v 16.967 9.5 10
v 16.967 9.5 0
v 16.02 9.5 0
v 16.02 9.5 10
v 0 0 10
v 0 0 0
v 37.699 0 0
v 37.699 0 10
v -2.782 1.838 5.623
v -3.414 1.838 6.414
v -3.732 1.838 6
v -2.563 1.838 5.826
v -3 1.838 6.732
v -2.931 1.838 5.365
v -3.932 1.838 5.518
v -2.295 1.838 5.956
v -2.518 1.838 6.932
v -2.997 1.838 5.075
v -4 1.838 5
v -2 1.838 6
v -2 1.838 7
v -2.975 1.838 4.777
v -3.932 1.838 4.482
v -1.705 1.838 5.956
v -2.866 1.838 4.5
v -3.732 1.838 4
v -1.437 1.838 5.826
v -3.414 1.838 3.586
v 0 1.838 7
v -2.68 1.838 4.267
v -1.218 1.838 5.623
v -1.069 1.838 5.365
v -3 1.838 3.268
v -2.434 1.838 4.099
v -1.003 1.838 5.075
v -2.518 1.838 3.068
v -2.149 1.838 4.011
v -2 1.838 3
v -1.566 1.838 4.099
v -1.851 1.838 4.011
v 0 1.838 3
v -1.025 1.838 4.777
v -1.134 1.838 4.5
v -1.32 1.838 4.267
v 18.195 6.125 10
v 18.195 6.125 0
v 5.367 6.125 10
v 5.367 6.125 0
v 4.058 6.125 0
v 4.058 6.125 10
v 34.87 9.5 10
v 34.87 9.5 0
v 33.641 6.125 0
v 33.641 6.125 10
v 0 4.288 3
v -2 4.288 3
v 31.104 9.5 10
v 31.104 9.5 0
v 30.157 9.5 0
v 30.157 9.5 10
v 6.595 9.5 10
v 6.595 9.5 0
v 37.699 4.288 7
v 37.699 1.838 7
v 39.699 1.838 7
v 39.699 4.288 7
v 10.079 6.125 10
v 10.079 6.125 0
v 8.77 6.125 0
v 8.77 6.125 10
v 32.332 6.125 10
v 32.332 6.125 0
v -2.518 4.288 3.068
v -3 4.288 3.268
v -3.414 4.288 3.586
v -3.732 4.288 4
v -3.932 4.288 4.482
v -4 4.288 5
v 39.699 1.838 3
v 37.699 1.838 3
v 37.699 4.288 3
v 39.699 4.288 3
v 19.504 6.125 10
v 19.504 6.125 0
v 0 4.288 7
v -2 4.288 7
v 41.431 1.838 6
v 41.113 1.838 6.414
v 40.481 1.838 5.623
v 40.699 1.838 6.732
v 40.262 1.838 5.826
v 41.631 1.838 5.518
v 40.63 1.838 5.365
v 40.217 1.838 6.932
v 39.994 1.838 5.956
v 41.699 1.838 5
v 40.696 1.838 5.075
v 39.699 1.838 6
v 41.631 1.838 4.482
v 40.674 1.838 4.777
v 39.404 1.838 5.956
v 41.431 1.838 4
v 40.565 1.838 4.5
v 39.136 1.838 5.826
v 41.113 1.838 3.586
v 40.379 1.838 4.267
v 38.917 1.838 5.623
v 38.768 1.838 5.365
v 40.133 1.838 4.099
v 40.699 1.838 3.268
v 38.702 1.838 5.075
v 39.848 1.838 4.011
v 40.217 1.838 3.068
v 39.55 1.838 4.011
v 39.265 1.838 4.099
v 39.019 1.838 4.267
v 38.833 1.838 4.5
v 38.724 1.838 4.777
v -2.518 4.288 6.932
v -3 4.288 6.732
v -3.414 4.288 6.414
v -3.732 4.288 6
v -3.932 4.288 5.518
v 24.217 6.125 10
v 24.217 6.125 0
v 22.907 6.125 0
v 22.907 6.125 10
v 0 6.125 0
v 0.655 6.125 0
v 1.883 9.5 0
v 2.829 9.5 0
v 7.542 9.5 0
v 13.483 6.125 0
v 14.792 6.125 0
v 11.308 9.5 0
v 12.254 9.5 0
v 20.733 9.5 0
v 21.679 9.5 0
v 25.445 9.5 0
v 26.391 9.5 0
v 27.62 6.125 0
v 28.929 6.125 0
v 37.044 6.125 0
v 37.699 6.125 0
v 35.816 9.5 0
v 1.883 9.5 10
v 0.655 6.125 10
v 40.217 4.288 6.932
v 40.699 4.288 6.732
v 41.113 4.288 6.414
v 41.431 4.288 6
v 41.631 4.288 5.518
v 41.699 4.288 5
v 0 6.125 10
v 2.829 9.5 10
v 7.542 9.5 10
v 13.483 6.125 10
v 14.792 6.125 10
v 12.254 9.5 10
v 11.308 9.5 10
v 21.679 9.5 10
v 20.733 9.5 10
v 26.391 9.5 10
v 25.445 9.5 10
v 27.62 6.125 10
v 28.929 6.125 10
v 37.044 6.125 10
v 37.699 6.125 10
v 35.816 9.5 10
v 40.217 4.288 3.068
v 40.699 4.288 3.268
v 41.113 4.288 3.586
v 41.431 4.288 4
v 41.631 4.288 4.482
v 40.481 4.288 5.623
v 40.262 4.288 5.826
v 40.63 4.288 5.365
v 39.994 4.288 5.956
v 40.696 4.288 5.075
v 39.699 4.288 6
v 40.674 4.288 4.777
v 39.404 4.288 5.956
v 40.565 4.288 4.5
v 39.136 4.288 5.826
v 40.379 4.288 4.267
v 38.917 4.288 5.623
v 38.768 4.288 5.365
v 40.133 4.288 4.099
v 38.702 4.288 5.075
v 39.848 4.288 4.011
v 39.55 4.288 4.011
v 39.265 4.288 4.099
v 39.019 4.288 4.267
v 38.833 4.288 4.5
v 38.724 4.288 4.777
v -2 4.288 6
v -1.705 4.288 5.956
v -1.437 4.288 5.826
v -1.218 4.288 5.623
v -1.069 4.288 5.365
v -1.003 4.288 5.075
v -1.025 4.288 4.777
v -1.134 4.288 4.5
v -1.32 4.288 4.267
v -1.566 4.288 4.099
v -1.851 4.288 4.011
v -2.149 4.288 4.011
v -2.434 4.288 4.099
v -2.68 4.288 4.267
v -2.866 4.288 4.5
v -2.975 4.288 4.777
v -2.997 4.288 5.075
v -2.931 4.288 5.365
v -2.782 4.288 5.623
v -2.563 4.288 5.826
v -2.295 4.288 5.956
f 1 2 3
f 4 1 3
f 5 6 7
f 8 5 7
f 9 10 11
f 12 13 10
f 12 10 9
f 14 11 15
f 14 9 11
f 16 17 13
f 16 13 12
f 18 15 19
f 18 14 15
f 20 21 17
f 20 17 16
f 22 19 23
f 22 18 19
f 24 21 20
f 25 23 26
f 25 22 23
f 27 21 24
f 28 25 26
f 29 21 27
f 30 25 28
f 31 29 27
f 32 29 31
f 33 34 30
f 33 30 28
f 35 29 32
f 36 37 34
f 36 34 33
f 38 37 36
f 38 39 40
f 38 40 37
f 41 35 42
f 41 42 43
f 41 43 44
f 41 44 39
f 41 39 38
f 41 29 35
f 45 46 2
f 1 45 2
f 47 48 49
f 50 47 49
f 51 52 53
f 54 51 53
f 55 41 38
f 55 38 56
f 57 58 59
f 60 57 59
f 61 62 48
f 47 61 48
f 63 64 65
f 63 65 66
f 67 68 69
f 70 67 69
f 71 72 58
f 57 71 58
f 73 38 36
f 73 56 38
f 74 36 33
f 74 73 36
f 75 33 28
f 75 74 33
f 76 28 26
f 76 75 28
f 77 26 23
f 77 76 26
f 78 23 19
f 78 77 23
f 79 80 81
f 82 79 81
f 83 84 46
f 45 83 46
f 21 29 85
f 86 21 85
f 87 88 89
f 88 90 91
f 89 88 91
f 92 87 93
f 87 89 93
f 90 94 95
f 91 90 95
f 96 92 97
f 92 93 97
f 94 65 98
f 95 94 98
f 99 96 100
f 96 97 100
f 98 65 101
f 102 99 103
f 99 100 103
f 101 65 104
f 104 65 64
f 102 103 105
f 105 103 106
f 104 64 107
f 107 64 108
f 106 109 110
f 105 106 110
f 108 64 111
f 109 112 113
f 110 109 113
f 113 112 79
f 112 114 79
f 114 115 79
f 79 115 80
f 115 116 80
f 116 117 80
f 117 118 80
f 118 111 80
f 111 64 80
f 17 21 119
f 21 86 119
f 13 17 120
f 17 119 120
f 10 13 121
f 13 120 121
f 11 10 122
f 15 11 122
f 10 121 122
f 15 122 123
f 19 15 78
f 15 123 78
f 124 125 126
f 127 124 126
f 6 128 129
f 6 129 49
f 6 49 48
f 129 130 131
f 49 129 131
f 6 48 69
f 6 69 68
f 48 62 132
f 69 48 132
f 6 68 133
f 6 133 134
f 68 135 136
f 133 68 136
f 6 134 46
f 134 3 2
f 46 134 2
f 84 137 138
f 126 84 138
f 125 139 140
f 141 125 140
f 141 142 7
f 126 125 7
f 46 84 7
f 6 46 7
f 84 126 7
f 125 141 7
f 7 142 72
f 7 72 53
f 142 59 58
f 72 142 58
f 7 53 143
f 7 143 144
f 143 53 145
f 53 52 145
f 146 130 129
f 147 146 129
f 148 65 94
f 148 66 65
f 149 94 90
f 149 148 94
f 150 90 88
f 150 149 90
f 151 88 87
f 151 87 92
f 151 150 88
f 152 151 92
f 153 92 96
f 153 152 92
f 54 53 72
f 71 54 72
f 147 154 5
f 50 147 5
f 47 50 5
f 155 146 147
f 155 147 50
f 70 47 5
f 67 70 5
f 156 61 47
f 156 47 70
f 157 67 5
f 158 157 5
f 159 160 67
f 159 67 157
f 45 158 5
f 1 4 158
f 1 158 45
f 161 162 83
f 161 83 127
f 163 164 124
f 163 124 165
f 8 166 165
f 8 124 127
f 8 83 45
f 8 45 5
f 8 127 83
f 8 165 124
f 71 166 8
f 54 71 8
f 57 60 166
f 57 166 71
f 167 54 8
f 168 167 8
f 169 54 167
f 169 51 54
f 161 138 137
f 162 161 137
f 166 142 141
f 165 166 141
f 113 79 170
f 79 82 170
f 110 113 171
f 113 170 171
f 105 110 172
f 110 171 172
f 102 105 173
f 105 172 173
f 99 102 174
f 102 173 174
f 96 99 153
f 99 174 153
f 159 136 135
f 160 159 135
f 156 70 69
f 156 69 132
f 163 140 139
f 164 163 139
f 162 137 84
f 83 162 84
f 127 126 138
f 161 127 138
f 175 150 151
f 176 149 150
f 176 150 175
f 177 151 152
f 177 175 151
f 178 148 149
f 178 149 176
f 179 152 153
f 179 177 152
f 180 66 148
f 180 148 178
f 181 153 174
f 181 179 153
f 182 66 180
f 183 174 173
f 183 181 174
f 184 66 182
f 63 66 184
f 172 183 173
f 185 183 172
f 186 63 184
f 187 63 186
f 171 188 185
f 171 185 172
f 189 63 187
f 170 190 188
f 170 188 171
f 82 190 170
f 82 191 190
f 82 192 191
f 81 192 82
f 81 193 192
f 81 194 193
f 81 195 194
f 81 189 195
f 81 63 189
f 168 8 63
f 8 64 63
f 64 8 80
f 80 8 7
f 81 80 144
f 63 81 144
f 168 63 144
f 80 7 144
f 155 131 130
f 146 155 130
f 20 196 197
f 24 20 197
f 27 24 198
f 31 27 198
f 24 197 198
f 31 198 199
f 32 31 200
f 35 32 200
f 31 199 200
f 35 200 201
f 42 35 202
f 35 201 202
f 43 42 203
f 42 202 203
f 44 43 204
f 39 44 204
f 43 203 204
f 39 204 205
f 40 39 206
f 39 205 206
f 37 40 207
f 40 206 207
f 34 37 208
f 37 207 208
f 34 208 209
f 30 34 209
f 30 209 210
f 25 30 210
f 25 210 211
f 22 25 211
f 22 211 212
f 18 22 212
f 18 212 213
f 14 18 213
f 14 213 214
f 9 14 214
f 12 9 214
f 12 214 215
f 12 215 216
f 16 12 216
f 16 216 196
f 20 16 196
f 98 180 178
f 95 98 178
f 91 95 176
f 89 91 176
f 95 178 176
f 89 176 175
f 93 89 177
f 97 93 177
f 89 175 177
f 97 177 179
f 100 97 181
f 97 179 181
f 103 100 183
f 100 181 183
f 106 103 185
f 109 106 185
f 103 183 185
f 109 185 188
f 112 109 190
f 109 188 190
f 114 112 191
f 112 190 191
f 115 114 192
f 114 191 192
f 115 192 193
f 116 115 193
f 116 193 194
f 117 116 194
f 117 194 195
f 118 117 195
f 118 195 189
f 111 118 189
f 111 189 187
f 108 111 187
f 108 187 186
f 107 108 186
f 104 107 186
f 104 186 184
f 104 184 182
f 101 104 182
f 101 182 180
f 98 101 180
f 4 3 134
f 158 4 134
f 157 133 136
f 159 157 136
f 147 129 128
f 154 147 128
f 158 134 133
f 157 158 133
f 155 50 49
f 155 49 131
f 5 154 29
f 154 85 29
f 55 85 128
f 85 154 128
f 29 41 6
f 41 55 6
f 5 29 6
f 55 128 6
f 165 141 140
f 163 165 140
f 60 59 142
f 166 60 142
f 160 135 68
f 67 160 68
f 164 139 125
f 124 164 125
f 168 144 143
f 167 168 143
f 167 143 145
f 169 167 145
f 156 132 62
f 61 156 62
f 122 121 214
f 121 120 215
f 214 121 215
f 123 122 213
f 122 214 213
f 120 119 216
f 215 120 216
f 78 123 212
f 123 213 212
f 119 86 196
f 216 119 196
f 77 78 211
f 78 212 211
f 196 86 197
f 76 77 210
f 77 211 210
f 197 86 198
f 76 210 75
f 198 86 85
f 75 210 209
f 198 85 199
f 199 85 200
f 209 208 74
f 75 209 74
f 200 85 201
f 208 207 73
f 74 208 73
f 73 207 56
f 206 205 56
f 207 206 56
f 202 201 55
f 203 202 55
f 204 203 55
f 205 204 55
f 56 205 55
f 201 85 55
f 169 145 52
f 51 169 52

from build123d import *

# Parameters (mm, degrees)
EXTRUIR1_DEPTH = 10
CROQUIS5_W     = 4
CROQUIS5_H     = 2.45
EXTRUIR2_DEPTH = 4
REDONDEO1_R    = 2
CROQUIS6_R     = 1
EXTRUIR3_DEPTH = 4


with BuildPart() as part:
    # Croquis4 → Extruir1 (new body)
    with BuildSketch(Plane.XY):
        Polygon((32.33206977, 6.125), (31.10367023, 9.5), (30.157386445, 9.5), (28.928986905, 6.125), (27.619680795, 6.125), (26.391281255, 9.5), (25.44499747, 9.5), (24.21659793, 6.125), (22.90729182, 6.125), (21.67889228, 9.5), (20.732608495, 9.5), (19.504208955, 6.125), (18.194902845, 6.125), (16.966503305, 9.5), (16.02021952, 9.5), (14.79181998, 6.125), (13.48251387, 6.125), (12.25411433, 9.5), (11.307830545, 9.5), (10.079431005, 6.125), (8.770124895, 6.125), (7.541725355, 9.5), (6.59544157, 9.5), (5.36704203, 6.125), (4.05773592, 6.125), (2.82933638, 9.5), (1.883052595, 9.5), (0.654653055, 6.125), (0, 6.125), (0, 0), (37.6991118, 0), (37.6991118, 6.125), (37.044458745, 6.125), (35.816059205, 9.5), (34.86977542, 9.5), (33.64137588, 6.125), align=None)
    extrude(amount=EXTRUIR1_DEPTH)

    # Croquis5 → Extruir2 (add)
    with BuildSketch(Plane(origin=(37.6991118, 0, 0), x_dir=(0, 0, -1), z_dir=(1, 0, 0))):
        with Locations((-5, 3.0625)):
            Rectangle(CROQUIS5_W, CROQUIS5_H)
    extruir2 = extrude(amount=EXTRUIR2_DEPTH)

    # Simetría1: Extruir2 across plane
    add(extruir2.mirror(Plane(origin=(18.8495559, 0, 0), x_dir=(0, 0, 1), z_dir=(1, 0, 0))))

    # Redondeo1
    redondeo1_edges = [part.edges().sort_by_distance(p)[0] for p in [
        (41.6991118, 3.0625, 7),
        (41.6991118, 3.0625, 3),
        (-4, 3.0625, 3),
        (-4, 3.0625, 7),
    ]]
    fillet(redondeo1_edges, radius=REDONDEO1_R - 0.0001)  # a hair under: the kernel refuses the full size

    # Croquis6 → Extruir3 (cut)
    with BuildSketch(Plane(origin=(0, 4.2875, 0), x_dir=(1, 0, 0), z_dir=(0, 1, 0))):
        with Locations(Location((39.6991118, -5, 0), (0, 0, 270))):
            Circle(CROQUIS6_R)
        with Locations(Location((-2, -5, 0), (0, 0, 270))):
            Circle(CROQUIS6_R)
    extrude(amount=-EXTRUIR3_DEPTH, mode=Mode.SUBTRACT)


solid = part.part
